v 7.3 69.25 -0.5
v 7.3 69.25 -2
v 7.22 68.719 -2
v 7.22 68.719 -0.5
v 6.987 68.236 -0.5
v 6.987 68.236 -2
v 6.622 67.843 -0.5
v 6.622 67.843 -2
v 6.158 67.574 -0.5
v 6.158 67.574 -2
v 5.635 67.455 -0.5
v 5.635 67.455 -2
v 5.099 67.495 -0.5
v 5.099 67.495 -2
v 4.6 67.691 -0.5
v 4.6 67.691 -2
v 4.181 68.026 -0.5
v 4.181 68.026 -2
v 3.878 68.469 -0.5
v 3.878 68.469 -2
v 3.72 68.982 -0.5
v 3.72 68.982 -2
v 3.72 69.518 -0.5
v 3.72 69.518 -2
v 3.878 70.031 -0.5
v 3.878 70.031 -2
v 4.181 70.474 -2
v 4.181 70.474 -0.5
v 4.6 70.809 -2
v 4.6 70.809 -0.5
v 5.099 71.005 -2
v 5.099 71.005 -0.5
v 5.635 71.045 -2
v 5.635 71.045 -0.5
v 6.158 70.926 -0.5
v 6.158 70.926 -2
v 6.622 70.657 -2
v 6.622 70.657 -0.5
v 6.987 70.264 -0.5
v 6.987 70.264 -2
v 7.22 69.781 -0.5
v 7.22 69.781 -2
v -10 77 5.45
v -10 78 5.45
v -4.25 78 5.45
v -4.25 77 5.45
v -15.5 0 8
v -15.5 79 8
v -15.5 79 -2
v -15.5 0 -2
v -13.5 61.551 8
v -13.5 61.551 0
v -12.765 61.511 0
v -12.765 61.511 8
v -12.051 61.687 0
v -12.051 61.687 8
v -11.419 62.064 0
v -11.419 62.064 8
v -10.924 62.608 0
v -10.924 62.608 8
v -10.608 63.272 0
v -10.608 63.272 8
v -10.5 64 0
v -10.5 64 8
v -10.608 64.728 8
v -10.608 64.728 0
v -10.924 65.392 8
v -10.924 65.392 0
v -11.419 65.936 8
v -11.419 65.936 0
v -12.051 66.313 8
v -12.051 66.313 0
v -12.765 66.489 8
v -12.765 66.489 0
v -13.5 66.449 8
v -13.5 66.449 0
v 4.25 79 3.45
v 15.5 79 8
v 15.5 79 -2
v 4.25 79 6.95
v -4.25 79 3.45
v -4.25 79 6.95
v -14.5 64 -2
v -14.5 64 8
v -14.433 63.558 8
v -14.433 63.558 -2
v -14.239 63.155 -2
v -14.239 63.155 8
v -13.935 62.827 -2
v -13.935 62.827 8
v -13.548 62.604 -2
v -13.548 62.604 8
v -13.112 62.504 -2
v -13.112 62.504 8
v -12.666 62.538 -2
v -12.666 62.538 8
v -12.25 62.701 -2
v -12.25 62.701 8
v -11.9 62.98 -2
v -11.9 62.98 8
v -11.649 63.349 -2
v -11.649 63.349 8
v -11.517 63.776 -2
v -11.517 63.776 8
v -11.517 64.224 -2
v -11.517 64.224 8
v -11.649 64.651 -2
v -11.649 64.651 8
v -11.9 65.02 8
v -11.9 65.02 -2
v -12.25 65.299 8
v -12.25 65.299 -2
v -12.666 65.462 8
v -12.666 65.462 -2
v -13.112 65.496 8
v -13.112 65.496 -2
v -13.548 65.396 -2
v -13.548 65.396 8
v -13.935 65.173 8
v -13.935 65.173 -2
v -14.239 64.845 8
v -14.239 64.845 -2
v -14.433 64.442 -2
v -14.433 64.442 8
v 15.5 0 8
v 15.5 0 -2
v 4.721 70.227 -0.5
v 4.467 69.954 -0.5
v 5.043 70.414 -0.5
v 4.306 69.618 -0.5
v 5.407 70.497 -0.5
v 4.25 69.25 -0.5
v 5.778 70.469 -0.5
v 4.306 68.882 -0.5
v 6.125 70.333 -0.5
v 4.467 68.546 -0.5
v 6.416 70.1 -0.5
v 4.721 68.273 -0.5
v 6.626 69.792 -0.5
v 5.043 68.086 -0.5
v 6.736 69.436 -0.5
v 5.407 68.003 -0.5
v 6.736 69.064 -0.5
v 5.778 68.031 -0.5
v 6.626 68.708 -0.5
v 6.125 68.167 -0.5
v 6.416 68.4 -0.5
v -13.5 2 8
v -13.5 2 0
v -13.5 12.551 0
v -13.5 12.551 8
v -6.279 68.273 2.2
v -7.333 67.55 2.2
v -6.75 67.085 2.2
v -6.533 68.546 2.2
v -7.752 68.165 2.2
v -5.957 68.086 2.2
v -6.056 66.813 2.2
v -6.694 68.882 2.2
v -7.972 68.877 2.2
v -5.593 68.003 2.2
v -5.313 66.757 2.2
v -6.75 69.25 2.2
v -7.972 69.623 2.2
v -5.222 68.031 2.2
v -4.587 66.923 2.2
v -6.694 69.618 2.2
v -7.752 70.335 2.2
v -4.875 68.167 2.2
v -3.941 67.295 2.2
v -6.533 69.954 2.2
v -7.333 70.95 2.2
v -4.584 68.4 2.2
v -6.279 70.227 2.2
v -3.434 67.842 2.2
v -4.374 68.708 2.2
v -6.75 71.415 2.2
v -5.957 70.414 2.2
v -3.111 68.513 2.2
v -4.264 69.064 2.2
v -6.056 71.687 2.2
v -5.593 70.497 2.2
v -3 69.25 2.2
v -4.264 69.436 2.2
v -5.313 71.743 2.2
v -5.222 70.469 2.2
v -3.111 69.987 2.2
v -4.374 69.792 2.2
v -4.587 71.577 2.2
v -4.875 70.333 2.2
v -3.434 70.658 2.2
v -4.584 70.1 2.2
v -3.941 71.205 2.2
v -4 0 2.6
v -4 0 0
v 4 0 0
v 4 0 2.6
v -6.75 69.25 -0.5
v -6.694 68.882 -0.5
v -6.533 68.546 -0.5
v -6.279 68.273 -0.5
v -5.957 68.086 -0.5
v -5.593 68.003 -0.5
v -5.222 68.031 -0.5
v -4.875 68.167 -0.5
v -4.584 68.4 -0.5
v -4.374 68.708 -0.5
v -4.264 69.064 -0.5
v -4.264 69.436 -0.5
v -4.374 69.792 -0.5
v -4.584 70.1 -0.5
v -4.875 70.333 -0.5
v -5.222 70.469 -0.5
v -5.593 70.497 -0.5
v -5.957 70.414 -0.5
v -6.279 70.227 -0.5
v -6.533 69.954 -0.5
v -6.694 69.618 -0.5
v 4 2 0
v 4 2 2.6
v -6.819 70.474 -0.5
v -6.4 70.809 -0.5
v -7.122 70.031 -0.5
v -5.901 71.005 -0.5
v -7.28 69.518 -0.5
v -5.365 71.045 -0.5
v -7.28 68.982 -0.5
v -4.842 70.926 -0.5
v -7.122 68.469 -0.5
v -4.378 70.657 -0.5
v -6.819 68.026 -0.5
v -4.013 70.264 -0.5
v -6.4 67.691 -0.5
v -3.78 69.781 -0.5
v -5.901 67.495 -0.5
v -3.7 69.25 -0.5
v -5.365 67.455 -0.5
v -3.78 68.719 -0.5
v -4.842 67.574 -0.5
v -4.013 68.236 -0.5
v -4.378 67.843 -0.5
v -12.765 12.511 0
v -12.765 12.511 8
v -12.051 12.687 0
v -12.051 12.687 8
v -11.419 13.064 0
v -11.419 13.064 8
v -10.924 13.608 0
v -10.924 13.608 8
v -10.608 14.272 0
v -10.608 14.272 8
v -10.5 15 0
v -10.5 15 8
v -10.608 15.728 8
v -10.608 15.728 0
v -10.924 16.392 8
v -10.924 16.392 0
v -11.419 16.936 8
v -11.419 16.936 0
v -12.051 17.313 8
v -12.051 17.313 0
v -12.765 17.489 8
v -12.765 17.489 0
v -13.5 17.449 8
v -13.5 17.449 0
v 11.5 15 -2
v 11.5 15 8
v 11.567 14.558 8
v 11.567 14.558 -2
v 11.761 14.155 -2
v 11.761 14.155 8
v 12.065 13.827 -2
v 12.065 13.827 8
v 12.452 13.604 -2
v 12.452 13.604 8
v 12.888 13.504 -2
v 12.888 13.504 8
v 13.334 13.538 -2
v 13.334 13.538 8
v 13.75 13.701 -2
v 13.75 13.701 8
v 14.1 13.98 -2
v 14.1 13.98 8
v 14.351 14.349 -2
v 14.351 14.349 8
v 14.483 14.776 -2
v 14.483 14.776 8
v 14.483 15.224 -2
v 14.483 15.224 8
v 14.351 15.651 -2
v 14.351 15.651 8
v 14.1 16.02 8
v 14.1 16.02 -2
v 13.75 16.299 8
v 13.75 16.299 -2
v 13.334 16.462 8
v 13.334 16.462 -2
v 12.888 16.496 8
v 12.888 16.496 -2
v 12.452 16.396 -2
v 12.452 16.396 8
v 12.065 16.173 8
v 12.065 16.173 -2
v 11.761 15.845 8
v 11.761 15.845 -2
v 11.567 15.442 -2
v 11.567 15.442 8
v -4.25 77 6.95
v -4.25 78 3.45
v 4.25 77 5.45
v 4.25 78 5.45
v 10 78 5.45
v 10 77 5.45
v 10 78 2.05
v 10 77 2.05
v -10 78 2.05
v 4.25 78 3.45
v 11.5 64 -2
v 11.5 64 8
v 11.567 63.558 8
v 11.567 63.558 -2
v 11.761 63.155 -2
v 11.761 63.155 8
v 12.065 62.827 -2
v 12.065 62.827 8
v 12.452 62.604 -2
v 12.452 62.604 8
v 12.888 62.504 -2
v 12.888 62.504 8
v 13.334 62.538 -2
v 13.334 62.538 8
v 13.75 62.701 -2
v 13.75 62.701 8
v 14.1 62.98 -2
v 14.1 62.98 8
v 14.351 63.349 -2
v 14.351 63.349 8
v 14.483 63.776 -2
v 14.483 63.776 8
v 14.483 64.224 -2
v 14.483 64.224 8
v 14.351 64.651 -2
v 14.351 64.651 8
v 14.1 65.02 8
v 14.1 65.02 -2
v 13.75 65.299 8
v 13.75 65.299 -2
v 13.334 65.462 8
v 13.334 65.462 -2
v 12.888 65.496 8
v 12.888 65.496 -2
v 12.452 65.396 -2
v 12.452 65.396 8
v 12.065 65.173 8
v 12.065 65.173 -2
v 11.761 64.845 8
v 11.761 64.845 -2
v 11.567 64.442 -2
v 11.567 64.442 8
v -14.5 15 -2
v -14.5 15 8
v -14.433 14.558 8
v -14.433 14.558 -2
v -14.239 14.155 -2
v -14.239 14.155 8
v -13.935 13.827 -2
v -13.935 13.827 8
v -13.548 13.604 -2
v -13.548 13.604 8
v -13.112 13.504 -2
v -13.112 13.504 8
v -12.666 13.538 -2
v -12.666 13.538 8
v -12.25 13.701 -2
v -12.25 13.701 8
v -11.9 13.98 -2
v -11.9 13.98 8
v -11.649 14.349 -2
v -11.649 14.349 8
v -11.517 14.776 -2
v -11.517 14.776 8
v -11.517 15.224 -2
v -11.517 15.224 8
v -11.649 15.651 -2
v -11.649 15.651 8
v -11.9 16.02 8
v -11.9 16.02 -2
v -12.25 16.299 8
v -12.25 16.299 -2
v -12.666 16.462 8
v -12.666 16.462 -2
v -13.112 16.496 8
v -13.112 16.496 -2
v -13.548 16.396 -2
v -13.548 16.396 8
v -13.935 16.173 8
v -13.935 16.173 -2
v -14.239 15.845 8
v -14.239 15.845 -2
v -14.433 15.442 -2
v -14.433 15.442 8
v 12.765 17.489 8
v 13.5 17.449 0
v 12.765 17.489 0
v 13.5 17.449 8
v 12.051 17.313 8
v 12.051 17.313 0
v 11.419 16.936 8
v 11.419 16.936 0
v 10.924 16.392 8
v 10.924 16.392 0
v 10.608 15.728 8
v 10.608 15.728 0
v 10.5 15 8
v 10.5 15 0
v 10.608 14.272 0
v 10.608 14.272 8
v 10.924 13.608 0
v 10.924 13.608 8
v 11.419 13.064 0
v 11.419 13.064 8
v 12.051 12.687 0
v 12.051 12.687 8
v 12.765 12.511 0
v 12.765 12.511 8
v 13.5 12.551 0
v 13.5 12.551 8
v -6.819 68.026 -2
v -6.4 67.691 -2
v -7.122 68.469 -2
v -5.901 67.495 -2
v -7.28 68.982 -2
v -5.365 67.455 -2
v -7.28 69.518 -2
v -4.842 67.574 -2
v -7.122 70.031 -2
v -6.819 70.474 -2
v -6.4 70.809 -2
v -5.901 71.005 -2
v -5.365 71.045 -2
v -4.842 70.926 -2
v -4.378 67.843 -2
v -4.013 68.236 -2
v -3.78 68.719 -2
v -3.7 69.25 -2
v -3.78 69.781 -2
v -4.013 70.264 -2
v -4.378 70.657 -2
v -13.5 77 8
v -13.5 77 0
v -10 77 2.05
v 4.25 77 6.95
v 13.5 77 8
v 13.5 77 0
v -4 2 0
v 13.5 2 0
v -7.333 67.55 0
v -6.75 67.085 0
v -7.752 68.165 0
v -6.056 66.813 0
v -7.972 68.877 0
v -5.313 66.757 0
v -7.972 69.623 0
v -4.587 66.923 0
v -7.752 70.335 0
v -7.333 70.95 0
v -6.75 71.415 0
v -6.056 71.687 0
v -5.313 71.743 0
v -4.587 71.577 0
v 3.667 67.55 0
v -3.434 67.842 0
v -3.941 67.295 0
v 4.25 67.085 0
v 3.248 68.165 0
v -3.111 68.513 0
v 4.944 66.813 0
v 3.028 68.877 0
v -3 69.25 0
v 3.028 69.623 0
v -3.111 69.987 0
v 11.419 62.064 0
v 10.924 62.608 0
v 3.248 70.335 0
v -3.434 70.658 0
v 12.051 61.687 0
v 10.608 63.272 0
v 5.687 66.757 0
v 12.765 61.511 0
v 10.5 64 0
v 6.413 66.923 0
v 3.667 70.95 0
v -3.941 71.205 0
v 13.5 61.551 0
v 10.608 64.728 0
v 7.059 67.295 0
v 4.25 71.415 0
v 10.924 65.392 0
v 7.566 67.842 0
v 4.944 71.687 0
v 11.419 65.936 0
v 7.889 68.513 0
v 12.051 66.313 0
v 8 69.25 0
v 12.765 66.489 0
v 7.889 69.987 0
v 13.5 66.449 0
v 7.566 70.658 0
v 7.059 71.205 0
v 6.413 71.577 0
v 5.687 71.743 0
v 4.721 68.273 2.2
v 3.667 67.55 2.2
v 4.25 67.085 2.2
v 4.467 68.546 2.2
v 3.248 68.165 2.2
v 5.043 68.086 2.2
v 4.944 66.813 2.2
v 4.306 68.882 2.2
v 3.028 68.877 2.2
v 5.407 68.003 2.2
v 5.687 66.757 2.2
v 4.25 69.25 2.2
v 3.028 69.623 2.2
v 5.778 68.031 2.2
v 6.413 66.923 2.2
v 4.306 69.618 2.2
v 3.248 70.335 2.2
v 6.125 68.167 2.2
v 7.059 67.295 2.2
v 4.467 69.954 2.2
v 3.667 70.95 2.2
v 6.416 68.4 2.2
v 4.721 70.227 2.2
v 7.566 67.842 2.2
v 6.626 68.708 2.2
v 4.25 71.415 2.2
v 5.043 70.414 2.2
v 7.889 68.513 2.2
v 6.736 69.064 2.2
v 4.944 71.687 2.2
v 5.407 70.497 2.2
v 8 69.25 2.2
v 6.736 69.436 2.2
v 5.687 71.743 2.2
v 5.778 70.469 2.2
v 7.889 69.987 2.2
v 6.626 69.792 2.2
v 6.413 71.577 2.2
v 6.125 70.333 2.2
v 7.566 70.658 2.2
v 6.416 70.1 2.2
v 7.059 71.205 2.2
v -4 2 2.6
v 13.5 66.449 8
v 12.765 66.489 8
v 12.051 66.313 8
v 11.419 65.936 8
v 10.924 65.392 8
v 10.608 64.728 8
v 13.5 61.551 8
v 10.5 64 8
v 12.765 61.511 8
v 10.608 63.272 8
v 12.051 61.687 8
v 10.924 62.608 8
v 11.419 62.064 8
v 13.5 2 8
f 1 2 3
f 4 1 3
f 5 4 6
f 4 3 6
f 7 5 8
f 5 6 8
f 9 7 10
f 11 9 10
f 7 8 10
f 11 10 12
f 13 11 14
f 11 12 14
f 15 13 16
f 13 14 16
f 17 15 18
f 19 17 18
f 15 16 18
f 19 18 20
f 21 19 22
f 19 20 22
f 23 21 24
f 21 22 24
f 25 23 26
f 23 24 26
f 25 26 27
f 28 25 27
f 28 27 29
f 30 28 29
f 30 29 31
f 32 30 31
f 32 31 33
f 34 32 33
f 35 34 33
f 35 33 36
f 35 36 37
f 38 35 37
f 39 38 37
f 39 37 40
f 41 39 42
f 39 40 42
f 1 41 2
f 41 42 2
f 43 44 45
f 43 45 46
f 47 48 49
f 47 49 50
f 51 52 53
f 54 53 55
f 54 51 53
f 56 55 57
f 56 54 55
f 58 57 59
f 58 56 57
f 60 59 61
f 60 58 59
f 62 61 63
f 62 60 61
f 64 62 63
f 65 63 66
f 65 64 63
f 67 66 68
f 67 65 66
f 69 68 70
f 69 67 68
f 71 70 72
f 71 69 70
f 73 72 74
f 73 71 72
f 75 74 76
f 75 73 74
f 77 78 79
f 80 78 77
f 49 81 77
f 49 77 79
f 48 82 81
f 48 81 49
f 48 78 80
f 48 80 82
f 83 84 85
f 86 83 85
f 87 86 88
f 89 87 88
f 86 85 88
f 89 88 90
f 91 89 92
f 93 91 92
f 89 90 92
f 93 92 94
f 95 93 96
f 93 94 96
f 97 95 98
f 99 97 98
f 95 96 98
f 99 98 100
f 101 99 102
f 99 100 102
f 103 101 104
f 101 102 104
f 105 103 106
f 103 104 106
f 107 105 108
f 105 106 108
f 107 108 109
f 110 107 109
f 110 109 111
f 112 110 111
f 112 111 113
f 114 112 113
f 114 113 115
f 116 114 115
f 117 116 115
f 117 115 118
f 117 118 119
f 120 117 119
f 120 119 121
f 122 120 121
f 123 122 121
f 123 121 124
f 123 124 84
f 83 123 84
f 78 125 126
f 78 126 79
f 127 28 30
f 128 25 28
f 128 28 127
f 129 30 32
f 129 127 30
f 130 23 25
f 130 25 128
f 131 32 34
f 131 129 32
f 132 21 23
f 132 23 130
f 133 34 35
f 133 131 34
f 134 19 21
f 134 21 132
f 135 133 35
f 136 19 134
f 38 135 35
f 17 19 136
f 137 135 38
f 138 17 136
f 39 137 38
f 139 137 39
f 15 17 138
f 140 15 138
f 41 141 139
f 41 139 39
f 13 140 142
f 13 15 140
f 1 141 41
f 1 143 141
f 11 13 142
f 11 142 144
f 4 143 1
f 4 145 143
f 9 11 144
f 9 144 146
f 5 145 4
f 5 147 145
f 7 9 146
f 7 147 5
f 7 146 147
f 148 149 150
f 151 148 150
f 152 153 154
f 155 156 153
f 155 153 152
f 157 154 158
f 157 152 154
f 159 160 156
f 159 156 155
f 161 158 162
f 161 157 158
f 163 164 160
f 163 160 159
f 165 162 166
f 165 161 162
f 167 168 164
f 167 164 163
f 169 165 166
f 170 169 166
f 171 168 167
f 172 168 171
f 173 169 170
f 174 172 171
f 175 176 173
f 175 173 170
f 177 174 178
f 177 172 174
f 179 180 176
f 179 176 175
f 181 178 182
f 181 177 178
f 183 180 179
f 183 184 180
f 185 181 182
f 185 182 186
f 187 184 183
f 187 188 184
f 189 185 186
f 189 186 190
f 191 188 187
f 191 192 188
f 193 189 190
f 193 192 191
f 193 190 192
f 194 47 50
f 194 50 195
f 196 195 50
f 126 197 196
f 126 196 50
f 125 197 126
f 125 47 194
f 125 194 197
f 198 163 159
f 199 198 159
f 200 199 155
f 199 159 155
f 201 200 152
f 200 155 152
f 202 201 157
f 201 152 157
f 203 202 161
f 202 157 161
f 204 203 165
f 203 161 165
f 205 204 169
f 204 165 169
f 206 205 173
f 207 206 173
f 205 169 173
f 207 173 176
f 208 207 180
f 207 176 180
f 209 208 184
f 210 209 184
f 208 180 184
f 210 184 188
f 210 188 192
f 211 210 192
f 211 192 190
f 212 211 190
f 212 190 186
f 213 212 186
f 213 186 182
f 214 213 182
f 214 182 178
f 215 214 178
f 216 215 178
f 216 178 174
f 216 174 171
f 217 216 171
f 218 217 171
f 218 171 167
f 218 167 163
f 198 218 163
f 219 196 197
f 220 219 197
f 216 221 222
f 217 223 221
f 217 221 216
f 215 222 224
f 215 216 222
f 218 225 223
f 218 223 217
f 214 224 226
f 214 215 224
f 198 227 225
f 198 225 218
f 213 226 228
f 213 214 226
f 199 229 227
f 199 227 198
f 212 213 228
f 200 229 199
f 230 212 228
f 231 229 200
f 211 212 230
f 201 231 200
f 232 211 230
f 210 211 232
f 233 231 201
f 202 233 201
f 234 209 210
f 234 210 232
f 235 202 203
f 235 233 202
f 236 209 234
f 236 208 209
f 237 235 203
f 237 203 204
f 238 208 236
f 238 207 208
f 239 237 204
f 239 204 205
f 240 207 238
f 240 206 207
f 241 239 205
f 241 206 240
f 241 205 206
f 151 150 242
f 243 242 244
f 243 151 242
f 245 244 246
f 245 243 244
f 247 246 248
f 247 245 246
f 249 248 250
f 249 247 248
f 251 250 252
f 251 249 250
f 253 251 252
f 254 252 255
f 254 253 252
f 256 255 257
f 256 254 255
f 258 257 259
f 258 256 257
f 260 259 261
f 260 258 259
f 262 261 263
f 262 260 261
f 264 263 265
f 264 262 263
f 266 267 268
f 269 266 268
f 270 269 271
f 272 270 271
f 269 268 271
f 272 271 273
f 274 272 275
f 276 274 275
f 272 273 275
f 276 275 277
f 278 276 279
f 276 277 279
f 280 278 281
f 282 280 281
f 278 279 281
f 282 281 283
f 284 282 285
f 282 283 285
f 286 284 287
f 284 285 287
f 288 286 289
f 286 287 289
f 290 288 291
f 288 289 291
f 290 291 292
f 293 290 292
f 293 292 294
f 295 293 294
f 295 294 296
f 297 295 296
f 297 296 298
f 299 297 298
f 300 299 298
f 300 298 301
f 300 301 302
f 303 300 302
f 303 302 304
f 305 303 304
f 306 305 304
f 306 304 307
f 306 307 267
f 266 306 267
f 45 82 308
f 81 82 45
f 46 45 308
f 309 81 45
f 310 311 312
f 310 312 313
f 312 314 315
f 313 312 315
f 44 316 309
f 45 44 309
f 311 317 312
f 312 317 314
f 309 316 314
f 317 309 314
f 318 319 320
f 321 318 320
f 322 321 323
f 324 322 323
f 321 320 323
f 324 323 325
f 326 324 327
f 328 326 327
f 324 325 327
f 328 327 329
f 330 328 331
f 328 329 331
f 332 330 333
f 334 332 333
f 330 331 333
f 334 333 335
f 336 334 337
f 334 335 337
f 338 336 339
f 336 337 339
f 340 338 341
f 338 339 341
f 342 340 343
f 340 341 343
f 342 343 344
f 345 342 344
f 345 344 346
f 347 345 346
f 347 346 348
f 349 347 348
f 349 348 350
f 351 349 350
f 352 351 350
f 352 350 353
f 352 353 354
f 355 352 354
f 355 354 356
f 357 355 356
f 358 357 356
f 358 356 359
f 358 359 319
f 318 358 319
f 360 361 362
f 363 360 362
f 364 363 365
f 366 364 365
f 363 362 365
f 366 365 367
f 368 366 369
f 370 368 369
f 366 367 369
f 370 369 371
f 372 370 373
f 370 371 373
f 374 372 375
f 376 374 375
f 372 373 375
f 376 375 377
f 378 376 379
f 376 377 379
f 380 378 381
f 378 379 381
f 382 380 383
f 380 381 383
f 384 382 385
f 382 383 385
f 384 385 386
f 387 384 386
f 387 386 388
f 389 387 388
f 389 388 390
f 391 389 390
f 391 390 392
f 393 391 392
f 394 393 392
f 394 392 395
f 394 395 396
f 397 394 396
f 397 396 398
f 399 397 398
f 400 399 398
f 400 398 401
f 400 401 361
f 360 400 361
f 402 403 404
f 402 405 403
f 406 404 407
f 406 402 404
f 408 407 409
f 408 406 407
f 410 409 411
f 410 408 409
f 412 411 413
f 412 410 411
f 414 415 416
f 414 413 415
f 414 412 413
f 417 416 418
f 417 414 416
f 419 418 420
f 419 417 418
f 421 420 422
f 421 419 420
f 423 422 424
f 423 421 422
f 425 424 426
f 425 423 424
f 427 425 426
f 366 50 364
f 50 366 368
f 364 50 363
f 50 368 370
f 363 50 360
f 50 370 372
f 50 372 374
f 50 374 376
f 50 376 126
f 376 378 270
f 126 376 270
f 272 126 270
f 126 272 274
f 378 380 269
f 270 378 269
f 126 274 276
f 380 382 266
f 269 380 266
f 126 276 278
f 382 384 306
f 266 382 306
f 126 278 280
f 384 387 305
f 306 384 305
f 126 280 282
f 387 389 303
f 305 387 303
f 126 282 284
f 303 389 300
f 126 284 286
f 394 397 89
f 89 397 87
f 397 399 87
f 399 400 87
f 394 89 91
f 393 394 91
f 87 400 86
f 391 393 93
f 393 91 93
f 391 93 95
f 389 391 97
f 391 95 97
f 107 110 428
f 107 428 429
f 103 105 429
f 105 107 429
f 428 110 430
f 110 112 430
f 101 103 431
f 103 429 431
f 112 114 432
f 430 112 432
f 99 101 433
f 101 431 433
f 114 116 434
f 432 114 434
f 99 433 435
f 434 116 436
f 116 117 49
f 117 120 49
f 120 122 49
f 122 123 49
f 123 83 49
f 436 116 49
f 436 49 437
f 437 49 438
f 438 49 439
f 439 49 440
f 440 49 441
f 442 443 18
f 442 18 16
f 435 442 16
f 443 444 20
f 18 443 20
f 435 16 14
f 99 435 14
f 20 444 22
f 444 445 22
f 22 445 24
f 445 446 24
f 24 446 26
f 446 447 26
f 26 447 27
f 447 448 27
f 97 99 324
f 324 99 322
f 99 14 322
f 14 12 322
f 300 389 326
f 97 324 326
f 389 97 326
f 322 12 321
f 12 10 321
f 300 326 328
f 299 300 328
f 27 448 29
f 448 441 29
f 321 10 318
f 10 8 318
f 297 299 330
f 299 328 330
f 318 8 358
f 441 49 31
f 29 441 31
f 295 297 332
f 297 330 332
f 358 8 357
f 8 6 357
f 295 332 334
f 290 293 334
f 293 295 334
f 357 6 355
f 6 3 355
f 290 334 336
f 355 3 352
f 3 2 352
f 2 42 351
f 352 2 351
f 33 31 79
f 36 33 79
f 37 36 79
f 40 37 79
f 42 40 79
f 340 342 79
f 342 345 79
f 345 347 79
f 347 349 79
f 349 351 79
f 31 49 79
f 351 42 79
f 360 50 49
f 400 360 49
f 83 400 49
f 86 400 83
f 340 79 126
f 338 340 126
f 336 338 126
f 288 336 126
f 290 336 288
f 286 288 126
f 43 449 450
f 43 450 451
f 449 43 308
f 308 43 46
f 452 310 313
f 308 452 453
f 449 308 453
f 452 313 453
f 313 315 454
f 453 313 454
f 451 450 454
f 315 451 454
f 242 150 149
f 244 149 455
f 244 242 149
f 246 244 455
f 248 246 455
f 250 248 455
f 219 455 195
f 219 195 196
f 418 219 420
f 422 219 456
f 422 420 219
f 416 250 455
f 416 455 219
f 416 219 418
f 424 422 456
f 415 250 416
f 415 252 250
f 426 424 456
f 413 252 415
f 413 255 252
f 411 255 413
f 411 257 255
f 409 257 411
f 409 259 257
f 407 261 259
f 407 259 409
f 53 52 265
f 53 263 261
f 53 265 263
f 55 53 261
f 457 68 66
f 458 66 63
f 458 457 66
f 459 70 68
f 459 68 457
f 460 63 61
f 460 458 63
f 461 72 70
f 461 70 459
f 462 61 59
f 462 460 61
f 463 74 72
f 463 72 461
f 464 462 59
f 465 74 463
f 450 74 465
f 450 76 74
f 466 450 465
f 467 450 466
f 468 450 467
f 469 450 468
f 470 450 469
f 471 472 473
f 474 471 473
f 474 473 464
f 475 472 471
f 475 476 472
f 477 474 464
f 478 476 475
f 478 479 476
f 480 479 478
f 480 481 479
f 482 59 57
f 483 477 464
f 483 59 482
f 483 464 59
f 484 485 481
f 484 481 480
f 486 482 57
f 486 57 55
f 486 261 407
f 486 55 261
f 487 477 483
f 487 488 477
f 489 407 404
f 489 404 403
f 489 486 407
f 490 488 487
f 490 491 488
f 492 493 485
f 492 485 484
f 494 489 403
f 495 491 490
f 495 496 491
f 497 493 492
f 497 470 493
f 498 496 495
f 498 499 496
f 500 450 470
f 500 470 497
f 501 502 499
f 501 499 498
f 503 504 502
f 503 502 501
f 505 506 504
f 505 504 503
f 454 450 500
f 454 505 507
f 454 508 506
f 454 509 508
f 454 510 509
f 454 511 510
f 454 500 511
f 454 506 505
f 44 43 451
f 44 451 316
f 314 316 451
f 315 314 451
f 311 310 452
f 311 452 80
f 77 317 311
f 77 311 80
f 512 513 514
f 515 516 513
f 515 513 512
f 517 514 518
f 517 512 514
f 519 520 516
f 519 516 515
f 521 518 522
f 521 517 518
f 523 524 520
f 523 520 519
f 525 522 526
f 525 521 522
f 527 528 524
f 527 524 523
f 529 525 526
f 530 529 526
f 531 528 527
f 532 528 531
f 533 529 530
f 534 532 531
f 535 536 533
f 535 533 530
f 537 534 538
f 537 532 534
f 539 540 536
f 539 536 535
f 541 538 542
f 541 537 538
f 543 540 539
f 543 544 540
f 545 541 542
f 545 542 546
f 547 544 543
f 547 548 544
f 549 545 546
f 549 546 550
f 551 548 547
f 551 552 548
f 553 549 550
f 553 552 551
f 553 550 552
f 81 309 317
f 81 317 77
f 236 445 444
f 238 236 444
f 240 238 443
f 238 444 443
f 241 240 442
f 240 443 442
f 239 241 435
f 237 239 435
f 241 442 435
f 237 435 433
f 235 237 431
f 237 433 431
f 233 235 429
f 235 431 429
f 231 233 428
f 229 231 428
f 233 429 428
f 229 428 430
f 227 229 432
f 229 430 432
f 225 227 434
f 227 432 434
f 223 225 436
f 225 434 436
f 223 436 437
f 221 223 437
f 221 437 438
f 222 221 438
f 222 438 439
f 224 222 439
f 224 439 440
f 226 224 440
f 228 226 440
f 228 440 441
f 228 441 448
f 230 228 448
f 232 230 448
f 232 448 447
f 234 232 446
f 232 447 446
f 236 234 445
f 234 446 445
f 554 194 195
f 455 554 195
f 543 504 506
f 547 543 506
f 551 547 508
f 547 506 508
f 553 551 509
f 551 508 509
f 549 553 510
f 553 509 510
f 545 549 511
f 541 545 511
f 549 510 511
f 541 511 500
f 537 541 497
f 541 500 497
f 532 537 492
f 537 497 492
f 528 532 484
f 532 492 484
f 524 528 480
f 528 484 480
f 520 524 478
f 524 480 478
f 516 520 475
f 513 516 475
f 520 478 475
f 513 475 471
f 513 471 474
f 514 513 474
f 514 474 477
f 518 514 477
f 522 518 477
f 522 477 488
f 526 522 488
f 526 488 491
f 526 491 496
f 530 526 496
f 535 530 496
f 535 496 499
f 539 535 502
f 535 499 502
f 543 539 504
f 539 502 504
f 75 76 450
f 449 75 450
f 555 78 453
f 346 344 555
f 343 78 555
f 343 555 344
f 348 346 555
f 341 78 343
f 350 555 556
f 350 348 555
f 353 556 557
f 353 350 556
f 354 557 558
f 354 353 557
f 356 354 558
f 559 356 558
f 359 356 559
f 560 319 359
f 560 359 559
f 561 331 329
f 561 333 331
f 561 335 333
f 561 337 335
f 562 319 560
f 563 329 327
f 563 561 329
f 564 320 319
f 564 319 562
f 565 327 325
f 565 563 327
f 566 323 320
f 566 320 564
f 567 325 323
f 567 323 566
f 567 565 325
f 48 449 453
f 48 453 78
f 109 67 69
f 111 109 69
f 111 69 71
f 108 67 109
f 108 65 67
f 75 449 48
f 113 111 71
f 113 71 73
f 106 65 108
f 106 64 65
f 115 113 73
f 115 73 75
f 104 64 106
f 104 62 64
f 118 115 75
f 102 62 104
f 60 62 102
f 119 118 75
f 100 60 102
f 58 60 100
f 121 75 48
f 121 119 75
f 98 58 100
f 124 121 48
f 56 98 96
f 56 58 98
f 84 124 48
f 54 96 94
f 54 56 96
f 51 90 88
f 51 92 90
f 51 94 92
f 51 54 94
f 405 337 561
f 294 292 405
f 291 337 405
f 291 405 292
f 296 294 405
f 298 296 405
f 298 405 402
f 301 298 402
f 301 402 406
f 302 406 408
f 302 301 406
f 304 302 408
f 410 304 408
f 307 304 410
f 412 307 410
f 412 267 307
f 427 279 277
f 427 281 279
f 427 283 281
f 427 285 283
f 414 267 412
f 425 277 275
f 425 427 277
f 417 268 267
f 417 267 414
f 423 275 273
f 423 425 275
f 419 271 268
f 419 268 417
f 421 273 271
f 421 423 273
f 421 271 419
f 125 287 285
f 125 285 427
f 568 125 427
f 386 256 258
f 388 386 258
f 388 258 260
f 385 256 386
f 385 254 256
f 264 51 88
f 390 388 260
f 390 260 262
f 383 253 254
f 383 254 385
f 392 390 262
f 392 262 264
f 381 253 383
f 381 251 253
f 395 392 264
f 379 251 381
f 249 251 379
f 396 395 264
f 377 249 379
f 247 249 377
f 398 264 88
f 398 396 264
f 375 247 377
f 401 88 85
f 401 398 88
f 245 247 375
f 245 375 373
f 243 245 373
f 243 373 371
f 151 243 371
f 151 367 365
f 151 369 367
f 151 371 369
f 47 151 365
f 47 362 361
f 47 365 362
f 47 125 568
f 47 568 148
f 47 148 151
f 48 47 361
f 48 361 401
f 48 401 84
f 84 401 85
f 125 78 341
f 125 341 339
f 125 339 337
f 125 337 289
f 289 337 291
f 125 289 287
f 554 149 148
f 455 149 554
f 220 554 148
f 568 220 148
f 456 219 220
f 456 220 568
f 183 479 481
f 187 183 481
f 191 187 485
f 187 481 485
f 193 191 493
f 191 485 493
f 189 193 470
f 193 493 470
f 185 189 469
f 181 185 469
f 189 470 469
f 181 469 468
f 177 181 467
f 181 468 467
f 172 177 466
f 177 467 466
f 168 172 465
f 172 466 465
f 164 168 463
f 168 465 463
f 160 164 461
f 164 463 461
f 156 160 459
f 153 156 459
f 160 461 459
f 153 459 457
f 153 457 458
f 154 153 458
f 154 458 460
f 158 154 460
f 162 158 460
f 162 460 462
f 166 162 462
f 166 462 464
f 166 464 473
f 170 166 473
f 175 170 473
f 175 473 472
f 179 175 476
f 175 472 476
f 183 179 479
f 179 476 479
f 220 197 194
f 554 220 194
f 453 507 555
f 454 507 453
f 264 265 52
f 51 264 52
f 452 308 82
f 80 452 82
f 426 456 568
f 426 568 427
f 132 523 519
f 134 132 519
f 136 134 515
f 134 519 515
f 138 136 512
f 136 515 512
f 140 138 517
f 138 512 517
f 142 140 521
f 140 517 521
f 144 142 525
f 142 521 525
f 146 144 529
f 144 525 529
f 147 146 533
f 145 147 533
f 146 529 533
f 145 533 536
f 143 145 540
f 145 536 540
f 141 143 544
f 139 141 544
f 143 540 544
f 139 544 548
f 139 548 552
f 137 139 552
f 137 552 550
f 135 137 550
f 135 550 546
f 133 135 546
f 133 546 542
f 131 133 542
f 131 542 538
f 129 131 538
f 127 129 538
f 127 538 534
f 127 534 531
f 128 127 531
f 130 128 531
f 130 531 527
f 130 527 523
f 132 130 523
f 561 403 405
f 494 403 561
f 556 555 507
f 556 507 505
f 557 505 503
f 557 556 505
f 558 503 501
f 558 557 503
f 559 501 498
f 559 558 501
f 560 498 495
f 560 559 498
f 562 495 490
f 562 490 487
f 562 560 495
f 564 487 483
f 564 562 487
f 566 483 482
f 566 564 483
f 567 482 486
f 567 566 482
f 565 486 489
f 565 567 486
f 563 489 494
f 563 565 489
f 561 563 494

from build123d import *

# Parameters (mm, degrees)
SKETCH_W             = 27
SKETCH_H             = 75
PAD_DEPTH            = 8
PAD001_DEPTH         = 2
SKETCH004_R          = 2.5
PAD002_DEPTH         = 2.2
SKETCH005_R          = 1.25
POCKET_DEPTH         = 4.201
SKETCH006_R          = 1.8
POCKET001_DEPTH      = 1.5
POCKET002_DEPTH      = 3.5
SKETCH008_R          = 2.5
PAD003_DEPTH         = 10
SKETCH009_R          = 1.5
POCKET003_DEPTH      = 13
POCKET004_DEPTH      = 1.4
POCKET004_DEPTH_BACK = 2
POCKET005_DEPTH      = 2


with BuildPart() as part:
    # Sketch → Pad (new body)
    with BuildSketch(Plane.XY):
        Polygon((0, 0), (15.5, 0), (15.5, 39.5), (15.5, 79), (0, 79), (-15.5, 79), (-15.5, 39.5), (-15.5, 0), align=None)
        with Locations((0, 39.5)):
            Rectangle(SKETCH_W, SKETCH_H, mode=Mode.SUBTRACT)
    extrude(amount=PAD_DEPTH)

    # Sketch001 → Pad001 (join)
    with BuildSketch(Plane.XY):
        Polygon((-15.5, 79), (-15.5, 39.5), (-15.5, 0), (0, 0), (15.5, 0), (15.5, 39.5), (15.5, 79), (0, 79), align=None)
    extrude(amount=-PAD001_DEPTH)

    # Sketch004 → Pad002 (join)
    with BuildSketch(Plane.XY):
        with Locations((-5.5, 69.25)):
            Circle(SKETCH004_R)
        with Locations((5.5, 69.25)):
            Circle(SKETCH004_R)
    extrude(amount=PAD002_DEPTH)

    # Sketch005 (on DatumPlane) → Pocket (cut, through all)
    with BuildSketch(Plane(origin=(-3, 69.25, 2.2), x_dir=(-1, 0, 0), z_dir=(0, 0, 1))):
        with Locations((2.5, 0)):
            Circle(SKETCH005_R)
        with Locations((-8.5, 0)):
            Circle(SKETCH005_R)
    extrude(amount=-POCKET_DEPTH, mode=Mode.SUBTRACT)

    # Sketch006 (on DatumPlane) → Pocket001 (cut)
    with BuildSketch(Plane(origin=(0, 79, -2), x_dir=(1, 0, 0), z_dir=(0, 0, -1))):
        with Locations((-5.5, 9.75)):
            Circle(SKETCH006_R)
        with Locations((5.5, 9.75)):
            Circle(SKETCH006_R)
    extrude(amount=-POCKET001_DEPTH, mode=Mode.SUBTRACT)

    # Sketch007 (on DatumPlane) → Pocket002 (cut)
    with BuildSketch(Plane(origin=(0, 69.25, 3.45), x_dir=(0, 1, 0), z_dir=(0, 0, 1))):
        Polygon((9.75, 0), (9.75, 4.25), (7.75, 4.25), (7.75, -4.25), (9.75, -4.25), align=None)
    extrude(amount=POCKET002_DEPTH, mode=Mode.SUBTRACT)

    # Sketch008 (on DatumPlane) → Pad003 (join)
    with BuildSketch(Plane(origin=(0, 79, 8), x_dir=(-1, 0, 0), z_dir=(0, 0, 1))):
        with Locations((-13, 15)):
            Circle(SKETCH008_R)
        with Locations((13, 15)):
            Circle(SKETCH008_R)
        with Locations((-13, 64)):
            Circle(SKETCH008_R)
        with Locations((13, 64)):
            Circle(SKETCH008_R)
    extrude(amount=-PAD003_DEPTH)

    # Sketch009 (on DatumPlane) → Pocket003 (cut)
    with BuildSketch(Plane(origin=(0, 79, 8), x_dir=(-1, 0, 0), z_dir=(0, 0, 1))):
        with Locations((-13, 15)):
            Circle(SKETCH009_R)
        with Locations((13, 15)):
            Circle(SKETCH009_R)
        with Locations((-13, 64)):
            Circle(SKETCH009_R)
        with Locations((13, 64)):
            Circle(SKETCH009_R)
    extrude(amount=-POCKET003_DEPTH, mode=Mode.SUBTRACT)

    # Sketch010 (on DatumPlane) → Pocket004 (cut, two sides)
    with BuildSketch(Plane(origin=(0, 69.25, 3.45), x_dir=(0, 1, 0), z_dir=(0, 0, 1))) as pocket004_sk:
        Polygon((7.75, 0), (7.75, 10), (8.75, 10), (8.75, -10), (7.75, -10), align=None)
    extrude(amount=-POCKET004_DEPTH, mode=Mode.SUBTRACT)
    extrude(pocket004_sk.sketch, amount=POCKET004_DEPTH_BACK, mode=Mode.SUBTRACT)

    # Sketch011 (on DatumPlane) → Pocket005 (cut)
    with BuildSketch(Plane.XZ):
        Polygon((0, 0), (4, 0), (4, 2.6), (-4, 2.6), (-4, 0), align=None)
    extrude(amount=-POCKET005_DEPTH, mode=Mode.SUBTRACT)


solid = part.part
